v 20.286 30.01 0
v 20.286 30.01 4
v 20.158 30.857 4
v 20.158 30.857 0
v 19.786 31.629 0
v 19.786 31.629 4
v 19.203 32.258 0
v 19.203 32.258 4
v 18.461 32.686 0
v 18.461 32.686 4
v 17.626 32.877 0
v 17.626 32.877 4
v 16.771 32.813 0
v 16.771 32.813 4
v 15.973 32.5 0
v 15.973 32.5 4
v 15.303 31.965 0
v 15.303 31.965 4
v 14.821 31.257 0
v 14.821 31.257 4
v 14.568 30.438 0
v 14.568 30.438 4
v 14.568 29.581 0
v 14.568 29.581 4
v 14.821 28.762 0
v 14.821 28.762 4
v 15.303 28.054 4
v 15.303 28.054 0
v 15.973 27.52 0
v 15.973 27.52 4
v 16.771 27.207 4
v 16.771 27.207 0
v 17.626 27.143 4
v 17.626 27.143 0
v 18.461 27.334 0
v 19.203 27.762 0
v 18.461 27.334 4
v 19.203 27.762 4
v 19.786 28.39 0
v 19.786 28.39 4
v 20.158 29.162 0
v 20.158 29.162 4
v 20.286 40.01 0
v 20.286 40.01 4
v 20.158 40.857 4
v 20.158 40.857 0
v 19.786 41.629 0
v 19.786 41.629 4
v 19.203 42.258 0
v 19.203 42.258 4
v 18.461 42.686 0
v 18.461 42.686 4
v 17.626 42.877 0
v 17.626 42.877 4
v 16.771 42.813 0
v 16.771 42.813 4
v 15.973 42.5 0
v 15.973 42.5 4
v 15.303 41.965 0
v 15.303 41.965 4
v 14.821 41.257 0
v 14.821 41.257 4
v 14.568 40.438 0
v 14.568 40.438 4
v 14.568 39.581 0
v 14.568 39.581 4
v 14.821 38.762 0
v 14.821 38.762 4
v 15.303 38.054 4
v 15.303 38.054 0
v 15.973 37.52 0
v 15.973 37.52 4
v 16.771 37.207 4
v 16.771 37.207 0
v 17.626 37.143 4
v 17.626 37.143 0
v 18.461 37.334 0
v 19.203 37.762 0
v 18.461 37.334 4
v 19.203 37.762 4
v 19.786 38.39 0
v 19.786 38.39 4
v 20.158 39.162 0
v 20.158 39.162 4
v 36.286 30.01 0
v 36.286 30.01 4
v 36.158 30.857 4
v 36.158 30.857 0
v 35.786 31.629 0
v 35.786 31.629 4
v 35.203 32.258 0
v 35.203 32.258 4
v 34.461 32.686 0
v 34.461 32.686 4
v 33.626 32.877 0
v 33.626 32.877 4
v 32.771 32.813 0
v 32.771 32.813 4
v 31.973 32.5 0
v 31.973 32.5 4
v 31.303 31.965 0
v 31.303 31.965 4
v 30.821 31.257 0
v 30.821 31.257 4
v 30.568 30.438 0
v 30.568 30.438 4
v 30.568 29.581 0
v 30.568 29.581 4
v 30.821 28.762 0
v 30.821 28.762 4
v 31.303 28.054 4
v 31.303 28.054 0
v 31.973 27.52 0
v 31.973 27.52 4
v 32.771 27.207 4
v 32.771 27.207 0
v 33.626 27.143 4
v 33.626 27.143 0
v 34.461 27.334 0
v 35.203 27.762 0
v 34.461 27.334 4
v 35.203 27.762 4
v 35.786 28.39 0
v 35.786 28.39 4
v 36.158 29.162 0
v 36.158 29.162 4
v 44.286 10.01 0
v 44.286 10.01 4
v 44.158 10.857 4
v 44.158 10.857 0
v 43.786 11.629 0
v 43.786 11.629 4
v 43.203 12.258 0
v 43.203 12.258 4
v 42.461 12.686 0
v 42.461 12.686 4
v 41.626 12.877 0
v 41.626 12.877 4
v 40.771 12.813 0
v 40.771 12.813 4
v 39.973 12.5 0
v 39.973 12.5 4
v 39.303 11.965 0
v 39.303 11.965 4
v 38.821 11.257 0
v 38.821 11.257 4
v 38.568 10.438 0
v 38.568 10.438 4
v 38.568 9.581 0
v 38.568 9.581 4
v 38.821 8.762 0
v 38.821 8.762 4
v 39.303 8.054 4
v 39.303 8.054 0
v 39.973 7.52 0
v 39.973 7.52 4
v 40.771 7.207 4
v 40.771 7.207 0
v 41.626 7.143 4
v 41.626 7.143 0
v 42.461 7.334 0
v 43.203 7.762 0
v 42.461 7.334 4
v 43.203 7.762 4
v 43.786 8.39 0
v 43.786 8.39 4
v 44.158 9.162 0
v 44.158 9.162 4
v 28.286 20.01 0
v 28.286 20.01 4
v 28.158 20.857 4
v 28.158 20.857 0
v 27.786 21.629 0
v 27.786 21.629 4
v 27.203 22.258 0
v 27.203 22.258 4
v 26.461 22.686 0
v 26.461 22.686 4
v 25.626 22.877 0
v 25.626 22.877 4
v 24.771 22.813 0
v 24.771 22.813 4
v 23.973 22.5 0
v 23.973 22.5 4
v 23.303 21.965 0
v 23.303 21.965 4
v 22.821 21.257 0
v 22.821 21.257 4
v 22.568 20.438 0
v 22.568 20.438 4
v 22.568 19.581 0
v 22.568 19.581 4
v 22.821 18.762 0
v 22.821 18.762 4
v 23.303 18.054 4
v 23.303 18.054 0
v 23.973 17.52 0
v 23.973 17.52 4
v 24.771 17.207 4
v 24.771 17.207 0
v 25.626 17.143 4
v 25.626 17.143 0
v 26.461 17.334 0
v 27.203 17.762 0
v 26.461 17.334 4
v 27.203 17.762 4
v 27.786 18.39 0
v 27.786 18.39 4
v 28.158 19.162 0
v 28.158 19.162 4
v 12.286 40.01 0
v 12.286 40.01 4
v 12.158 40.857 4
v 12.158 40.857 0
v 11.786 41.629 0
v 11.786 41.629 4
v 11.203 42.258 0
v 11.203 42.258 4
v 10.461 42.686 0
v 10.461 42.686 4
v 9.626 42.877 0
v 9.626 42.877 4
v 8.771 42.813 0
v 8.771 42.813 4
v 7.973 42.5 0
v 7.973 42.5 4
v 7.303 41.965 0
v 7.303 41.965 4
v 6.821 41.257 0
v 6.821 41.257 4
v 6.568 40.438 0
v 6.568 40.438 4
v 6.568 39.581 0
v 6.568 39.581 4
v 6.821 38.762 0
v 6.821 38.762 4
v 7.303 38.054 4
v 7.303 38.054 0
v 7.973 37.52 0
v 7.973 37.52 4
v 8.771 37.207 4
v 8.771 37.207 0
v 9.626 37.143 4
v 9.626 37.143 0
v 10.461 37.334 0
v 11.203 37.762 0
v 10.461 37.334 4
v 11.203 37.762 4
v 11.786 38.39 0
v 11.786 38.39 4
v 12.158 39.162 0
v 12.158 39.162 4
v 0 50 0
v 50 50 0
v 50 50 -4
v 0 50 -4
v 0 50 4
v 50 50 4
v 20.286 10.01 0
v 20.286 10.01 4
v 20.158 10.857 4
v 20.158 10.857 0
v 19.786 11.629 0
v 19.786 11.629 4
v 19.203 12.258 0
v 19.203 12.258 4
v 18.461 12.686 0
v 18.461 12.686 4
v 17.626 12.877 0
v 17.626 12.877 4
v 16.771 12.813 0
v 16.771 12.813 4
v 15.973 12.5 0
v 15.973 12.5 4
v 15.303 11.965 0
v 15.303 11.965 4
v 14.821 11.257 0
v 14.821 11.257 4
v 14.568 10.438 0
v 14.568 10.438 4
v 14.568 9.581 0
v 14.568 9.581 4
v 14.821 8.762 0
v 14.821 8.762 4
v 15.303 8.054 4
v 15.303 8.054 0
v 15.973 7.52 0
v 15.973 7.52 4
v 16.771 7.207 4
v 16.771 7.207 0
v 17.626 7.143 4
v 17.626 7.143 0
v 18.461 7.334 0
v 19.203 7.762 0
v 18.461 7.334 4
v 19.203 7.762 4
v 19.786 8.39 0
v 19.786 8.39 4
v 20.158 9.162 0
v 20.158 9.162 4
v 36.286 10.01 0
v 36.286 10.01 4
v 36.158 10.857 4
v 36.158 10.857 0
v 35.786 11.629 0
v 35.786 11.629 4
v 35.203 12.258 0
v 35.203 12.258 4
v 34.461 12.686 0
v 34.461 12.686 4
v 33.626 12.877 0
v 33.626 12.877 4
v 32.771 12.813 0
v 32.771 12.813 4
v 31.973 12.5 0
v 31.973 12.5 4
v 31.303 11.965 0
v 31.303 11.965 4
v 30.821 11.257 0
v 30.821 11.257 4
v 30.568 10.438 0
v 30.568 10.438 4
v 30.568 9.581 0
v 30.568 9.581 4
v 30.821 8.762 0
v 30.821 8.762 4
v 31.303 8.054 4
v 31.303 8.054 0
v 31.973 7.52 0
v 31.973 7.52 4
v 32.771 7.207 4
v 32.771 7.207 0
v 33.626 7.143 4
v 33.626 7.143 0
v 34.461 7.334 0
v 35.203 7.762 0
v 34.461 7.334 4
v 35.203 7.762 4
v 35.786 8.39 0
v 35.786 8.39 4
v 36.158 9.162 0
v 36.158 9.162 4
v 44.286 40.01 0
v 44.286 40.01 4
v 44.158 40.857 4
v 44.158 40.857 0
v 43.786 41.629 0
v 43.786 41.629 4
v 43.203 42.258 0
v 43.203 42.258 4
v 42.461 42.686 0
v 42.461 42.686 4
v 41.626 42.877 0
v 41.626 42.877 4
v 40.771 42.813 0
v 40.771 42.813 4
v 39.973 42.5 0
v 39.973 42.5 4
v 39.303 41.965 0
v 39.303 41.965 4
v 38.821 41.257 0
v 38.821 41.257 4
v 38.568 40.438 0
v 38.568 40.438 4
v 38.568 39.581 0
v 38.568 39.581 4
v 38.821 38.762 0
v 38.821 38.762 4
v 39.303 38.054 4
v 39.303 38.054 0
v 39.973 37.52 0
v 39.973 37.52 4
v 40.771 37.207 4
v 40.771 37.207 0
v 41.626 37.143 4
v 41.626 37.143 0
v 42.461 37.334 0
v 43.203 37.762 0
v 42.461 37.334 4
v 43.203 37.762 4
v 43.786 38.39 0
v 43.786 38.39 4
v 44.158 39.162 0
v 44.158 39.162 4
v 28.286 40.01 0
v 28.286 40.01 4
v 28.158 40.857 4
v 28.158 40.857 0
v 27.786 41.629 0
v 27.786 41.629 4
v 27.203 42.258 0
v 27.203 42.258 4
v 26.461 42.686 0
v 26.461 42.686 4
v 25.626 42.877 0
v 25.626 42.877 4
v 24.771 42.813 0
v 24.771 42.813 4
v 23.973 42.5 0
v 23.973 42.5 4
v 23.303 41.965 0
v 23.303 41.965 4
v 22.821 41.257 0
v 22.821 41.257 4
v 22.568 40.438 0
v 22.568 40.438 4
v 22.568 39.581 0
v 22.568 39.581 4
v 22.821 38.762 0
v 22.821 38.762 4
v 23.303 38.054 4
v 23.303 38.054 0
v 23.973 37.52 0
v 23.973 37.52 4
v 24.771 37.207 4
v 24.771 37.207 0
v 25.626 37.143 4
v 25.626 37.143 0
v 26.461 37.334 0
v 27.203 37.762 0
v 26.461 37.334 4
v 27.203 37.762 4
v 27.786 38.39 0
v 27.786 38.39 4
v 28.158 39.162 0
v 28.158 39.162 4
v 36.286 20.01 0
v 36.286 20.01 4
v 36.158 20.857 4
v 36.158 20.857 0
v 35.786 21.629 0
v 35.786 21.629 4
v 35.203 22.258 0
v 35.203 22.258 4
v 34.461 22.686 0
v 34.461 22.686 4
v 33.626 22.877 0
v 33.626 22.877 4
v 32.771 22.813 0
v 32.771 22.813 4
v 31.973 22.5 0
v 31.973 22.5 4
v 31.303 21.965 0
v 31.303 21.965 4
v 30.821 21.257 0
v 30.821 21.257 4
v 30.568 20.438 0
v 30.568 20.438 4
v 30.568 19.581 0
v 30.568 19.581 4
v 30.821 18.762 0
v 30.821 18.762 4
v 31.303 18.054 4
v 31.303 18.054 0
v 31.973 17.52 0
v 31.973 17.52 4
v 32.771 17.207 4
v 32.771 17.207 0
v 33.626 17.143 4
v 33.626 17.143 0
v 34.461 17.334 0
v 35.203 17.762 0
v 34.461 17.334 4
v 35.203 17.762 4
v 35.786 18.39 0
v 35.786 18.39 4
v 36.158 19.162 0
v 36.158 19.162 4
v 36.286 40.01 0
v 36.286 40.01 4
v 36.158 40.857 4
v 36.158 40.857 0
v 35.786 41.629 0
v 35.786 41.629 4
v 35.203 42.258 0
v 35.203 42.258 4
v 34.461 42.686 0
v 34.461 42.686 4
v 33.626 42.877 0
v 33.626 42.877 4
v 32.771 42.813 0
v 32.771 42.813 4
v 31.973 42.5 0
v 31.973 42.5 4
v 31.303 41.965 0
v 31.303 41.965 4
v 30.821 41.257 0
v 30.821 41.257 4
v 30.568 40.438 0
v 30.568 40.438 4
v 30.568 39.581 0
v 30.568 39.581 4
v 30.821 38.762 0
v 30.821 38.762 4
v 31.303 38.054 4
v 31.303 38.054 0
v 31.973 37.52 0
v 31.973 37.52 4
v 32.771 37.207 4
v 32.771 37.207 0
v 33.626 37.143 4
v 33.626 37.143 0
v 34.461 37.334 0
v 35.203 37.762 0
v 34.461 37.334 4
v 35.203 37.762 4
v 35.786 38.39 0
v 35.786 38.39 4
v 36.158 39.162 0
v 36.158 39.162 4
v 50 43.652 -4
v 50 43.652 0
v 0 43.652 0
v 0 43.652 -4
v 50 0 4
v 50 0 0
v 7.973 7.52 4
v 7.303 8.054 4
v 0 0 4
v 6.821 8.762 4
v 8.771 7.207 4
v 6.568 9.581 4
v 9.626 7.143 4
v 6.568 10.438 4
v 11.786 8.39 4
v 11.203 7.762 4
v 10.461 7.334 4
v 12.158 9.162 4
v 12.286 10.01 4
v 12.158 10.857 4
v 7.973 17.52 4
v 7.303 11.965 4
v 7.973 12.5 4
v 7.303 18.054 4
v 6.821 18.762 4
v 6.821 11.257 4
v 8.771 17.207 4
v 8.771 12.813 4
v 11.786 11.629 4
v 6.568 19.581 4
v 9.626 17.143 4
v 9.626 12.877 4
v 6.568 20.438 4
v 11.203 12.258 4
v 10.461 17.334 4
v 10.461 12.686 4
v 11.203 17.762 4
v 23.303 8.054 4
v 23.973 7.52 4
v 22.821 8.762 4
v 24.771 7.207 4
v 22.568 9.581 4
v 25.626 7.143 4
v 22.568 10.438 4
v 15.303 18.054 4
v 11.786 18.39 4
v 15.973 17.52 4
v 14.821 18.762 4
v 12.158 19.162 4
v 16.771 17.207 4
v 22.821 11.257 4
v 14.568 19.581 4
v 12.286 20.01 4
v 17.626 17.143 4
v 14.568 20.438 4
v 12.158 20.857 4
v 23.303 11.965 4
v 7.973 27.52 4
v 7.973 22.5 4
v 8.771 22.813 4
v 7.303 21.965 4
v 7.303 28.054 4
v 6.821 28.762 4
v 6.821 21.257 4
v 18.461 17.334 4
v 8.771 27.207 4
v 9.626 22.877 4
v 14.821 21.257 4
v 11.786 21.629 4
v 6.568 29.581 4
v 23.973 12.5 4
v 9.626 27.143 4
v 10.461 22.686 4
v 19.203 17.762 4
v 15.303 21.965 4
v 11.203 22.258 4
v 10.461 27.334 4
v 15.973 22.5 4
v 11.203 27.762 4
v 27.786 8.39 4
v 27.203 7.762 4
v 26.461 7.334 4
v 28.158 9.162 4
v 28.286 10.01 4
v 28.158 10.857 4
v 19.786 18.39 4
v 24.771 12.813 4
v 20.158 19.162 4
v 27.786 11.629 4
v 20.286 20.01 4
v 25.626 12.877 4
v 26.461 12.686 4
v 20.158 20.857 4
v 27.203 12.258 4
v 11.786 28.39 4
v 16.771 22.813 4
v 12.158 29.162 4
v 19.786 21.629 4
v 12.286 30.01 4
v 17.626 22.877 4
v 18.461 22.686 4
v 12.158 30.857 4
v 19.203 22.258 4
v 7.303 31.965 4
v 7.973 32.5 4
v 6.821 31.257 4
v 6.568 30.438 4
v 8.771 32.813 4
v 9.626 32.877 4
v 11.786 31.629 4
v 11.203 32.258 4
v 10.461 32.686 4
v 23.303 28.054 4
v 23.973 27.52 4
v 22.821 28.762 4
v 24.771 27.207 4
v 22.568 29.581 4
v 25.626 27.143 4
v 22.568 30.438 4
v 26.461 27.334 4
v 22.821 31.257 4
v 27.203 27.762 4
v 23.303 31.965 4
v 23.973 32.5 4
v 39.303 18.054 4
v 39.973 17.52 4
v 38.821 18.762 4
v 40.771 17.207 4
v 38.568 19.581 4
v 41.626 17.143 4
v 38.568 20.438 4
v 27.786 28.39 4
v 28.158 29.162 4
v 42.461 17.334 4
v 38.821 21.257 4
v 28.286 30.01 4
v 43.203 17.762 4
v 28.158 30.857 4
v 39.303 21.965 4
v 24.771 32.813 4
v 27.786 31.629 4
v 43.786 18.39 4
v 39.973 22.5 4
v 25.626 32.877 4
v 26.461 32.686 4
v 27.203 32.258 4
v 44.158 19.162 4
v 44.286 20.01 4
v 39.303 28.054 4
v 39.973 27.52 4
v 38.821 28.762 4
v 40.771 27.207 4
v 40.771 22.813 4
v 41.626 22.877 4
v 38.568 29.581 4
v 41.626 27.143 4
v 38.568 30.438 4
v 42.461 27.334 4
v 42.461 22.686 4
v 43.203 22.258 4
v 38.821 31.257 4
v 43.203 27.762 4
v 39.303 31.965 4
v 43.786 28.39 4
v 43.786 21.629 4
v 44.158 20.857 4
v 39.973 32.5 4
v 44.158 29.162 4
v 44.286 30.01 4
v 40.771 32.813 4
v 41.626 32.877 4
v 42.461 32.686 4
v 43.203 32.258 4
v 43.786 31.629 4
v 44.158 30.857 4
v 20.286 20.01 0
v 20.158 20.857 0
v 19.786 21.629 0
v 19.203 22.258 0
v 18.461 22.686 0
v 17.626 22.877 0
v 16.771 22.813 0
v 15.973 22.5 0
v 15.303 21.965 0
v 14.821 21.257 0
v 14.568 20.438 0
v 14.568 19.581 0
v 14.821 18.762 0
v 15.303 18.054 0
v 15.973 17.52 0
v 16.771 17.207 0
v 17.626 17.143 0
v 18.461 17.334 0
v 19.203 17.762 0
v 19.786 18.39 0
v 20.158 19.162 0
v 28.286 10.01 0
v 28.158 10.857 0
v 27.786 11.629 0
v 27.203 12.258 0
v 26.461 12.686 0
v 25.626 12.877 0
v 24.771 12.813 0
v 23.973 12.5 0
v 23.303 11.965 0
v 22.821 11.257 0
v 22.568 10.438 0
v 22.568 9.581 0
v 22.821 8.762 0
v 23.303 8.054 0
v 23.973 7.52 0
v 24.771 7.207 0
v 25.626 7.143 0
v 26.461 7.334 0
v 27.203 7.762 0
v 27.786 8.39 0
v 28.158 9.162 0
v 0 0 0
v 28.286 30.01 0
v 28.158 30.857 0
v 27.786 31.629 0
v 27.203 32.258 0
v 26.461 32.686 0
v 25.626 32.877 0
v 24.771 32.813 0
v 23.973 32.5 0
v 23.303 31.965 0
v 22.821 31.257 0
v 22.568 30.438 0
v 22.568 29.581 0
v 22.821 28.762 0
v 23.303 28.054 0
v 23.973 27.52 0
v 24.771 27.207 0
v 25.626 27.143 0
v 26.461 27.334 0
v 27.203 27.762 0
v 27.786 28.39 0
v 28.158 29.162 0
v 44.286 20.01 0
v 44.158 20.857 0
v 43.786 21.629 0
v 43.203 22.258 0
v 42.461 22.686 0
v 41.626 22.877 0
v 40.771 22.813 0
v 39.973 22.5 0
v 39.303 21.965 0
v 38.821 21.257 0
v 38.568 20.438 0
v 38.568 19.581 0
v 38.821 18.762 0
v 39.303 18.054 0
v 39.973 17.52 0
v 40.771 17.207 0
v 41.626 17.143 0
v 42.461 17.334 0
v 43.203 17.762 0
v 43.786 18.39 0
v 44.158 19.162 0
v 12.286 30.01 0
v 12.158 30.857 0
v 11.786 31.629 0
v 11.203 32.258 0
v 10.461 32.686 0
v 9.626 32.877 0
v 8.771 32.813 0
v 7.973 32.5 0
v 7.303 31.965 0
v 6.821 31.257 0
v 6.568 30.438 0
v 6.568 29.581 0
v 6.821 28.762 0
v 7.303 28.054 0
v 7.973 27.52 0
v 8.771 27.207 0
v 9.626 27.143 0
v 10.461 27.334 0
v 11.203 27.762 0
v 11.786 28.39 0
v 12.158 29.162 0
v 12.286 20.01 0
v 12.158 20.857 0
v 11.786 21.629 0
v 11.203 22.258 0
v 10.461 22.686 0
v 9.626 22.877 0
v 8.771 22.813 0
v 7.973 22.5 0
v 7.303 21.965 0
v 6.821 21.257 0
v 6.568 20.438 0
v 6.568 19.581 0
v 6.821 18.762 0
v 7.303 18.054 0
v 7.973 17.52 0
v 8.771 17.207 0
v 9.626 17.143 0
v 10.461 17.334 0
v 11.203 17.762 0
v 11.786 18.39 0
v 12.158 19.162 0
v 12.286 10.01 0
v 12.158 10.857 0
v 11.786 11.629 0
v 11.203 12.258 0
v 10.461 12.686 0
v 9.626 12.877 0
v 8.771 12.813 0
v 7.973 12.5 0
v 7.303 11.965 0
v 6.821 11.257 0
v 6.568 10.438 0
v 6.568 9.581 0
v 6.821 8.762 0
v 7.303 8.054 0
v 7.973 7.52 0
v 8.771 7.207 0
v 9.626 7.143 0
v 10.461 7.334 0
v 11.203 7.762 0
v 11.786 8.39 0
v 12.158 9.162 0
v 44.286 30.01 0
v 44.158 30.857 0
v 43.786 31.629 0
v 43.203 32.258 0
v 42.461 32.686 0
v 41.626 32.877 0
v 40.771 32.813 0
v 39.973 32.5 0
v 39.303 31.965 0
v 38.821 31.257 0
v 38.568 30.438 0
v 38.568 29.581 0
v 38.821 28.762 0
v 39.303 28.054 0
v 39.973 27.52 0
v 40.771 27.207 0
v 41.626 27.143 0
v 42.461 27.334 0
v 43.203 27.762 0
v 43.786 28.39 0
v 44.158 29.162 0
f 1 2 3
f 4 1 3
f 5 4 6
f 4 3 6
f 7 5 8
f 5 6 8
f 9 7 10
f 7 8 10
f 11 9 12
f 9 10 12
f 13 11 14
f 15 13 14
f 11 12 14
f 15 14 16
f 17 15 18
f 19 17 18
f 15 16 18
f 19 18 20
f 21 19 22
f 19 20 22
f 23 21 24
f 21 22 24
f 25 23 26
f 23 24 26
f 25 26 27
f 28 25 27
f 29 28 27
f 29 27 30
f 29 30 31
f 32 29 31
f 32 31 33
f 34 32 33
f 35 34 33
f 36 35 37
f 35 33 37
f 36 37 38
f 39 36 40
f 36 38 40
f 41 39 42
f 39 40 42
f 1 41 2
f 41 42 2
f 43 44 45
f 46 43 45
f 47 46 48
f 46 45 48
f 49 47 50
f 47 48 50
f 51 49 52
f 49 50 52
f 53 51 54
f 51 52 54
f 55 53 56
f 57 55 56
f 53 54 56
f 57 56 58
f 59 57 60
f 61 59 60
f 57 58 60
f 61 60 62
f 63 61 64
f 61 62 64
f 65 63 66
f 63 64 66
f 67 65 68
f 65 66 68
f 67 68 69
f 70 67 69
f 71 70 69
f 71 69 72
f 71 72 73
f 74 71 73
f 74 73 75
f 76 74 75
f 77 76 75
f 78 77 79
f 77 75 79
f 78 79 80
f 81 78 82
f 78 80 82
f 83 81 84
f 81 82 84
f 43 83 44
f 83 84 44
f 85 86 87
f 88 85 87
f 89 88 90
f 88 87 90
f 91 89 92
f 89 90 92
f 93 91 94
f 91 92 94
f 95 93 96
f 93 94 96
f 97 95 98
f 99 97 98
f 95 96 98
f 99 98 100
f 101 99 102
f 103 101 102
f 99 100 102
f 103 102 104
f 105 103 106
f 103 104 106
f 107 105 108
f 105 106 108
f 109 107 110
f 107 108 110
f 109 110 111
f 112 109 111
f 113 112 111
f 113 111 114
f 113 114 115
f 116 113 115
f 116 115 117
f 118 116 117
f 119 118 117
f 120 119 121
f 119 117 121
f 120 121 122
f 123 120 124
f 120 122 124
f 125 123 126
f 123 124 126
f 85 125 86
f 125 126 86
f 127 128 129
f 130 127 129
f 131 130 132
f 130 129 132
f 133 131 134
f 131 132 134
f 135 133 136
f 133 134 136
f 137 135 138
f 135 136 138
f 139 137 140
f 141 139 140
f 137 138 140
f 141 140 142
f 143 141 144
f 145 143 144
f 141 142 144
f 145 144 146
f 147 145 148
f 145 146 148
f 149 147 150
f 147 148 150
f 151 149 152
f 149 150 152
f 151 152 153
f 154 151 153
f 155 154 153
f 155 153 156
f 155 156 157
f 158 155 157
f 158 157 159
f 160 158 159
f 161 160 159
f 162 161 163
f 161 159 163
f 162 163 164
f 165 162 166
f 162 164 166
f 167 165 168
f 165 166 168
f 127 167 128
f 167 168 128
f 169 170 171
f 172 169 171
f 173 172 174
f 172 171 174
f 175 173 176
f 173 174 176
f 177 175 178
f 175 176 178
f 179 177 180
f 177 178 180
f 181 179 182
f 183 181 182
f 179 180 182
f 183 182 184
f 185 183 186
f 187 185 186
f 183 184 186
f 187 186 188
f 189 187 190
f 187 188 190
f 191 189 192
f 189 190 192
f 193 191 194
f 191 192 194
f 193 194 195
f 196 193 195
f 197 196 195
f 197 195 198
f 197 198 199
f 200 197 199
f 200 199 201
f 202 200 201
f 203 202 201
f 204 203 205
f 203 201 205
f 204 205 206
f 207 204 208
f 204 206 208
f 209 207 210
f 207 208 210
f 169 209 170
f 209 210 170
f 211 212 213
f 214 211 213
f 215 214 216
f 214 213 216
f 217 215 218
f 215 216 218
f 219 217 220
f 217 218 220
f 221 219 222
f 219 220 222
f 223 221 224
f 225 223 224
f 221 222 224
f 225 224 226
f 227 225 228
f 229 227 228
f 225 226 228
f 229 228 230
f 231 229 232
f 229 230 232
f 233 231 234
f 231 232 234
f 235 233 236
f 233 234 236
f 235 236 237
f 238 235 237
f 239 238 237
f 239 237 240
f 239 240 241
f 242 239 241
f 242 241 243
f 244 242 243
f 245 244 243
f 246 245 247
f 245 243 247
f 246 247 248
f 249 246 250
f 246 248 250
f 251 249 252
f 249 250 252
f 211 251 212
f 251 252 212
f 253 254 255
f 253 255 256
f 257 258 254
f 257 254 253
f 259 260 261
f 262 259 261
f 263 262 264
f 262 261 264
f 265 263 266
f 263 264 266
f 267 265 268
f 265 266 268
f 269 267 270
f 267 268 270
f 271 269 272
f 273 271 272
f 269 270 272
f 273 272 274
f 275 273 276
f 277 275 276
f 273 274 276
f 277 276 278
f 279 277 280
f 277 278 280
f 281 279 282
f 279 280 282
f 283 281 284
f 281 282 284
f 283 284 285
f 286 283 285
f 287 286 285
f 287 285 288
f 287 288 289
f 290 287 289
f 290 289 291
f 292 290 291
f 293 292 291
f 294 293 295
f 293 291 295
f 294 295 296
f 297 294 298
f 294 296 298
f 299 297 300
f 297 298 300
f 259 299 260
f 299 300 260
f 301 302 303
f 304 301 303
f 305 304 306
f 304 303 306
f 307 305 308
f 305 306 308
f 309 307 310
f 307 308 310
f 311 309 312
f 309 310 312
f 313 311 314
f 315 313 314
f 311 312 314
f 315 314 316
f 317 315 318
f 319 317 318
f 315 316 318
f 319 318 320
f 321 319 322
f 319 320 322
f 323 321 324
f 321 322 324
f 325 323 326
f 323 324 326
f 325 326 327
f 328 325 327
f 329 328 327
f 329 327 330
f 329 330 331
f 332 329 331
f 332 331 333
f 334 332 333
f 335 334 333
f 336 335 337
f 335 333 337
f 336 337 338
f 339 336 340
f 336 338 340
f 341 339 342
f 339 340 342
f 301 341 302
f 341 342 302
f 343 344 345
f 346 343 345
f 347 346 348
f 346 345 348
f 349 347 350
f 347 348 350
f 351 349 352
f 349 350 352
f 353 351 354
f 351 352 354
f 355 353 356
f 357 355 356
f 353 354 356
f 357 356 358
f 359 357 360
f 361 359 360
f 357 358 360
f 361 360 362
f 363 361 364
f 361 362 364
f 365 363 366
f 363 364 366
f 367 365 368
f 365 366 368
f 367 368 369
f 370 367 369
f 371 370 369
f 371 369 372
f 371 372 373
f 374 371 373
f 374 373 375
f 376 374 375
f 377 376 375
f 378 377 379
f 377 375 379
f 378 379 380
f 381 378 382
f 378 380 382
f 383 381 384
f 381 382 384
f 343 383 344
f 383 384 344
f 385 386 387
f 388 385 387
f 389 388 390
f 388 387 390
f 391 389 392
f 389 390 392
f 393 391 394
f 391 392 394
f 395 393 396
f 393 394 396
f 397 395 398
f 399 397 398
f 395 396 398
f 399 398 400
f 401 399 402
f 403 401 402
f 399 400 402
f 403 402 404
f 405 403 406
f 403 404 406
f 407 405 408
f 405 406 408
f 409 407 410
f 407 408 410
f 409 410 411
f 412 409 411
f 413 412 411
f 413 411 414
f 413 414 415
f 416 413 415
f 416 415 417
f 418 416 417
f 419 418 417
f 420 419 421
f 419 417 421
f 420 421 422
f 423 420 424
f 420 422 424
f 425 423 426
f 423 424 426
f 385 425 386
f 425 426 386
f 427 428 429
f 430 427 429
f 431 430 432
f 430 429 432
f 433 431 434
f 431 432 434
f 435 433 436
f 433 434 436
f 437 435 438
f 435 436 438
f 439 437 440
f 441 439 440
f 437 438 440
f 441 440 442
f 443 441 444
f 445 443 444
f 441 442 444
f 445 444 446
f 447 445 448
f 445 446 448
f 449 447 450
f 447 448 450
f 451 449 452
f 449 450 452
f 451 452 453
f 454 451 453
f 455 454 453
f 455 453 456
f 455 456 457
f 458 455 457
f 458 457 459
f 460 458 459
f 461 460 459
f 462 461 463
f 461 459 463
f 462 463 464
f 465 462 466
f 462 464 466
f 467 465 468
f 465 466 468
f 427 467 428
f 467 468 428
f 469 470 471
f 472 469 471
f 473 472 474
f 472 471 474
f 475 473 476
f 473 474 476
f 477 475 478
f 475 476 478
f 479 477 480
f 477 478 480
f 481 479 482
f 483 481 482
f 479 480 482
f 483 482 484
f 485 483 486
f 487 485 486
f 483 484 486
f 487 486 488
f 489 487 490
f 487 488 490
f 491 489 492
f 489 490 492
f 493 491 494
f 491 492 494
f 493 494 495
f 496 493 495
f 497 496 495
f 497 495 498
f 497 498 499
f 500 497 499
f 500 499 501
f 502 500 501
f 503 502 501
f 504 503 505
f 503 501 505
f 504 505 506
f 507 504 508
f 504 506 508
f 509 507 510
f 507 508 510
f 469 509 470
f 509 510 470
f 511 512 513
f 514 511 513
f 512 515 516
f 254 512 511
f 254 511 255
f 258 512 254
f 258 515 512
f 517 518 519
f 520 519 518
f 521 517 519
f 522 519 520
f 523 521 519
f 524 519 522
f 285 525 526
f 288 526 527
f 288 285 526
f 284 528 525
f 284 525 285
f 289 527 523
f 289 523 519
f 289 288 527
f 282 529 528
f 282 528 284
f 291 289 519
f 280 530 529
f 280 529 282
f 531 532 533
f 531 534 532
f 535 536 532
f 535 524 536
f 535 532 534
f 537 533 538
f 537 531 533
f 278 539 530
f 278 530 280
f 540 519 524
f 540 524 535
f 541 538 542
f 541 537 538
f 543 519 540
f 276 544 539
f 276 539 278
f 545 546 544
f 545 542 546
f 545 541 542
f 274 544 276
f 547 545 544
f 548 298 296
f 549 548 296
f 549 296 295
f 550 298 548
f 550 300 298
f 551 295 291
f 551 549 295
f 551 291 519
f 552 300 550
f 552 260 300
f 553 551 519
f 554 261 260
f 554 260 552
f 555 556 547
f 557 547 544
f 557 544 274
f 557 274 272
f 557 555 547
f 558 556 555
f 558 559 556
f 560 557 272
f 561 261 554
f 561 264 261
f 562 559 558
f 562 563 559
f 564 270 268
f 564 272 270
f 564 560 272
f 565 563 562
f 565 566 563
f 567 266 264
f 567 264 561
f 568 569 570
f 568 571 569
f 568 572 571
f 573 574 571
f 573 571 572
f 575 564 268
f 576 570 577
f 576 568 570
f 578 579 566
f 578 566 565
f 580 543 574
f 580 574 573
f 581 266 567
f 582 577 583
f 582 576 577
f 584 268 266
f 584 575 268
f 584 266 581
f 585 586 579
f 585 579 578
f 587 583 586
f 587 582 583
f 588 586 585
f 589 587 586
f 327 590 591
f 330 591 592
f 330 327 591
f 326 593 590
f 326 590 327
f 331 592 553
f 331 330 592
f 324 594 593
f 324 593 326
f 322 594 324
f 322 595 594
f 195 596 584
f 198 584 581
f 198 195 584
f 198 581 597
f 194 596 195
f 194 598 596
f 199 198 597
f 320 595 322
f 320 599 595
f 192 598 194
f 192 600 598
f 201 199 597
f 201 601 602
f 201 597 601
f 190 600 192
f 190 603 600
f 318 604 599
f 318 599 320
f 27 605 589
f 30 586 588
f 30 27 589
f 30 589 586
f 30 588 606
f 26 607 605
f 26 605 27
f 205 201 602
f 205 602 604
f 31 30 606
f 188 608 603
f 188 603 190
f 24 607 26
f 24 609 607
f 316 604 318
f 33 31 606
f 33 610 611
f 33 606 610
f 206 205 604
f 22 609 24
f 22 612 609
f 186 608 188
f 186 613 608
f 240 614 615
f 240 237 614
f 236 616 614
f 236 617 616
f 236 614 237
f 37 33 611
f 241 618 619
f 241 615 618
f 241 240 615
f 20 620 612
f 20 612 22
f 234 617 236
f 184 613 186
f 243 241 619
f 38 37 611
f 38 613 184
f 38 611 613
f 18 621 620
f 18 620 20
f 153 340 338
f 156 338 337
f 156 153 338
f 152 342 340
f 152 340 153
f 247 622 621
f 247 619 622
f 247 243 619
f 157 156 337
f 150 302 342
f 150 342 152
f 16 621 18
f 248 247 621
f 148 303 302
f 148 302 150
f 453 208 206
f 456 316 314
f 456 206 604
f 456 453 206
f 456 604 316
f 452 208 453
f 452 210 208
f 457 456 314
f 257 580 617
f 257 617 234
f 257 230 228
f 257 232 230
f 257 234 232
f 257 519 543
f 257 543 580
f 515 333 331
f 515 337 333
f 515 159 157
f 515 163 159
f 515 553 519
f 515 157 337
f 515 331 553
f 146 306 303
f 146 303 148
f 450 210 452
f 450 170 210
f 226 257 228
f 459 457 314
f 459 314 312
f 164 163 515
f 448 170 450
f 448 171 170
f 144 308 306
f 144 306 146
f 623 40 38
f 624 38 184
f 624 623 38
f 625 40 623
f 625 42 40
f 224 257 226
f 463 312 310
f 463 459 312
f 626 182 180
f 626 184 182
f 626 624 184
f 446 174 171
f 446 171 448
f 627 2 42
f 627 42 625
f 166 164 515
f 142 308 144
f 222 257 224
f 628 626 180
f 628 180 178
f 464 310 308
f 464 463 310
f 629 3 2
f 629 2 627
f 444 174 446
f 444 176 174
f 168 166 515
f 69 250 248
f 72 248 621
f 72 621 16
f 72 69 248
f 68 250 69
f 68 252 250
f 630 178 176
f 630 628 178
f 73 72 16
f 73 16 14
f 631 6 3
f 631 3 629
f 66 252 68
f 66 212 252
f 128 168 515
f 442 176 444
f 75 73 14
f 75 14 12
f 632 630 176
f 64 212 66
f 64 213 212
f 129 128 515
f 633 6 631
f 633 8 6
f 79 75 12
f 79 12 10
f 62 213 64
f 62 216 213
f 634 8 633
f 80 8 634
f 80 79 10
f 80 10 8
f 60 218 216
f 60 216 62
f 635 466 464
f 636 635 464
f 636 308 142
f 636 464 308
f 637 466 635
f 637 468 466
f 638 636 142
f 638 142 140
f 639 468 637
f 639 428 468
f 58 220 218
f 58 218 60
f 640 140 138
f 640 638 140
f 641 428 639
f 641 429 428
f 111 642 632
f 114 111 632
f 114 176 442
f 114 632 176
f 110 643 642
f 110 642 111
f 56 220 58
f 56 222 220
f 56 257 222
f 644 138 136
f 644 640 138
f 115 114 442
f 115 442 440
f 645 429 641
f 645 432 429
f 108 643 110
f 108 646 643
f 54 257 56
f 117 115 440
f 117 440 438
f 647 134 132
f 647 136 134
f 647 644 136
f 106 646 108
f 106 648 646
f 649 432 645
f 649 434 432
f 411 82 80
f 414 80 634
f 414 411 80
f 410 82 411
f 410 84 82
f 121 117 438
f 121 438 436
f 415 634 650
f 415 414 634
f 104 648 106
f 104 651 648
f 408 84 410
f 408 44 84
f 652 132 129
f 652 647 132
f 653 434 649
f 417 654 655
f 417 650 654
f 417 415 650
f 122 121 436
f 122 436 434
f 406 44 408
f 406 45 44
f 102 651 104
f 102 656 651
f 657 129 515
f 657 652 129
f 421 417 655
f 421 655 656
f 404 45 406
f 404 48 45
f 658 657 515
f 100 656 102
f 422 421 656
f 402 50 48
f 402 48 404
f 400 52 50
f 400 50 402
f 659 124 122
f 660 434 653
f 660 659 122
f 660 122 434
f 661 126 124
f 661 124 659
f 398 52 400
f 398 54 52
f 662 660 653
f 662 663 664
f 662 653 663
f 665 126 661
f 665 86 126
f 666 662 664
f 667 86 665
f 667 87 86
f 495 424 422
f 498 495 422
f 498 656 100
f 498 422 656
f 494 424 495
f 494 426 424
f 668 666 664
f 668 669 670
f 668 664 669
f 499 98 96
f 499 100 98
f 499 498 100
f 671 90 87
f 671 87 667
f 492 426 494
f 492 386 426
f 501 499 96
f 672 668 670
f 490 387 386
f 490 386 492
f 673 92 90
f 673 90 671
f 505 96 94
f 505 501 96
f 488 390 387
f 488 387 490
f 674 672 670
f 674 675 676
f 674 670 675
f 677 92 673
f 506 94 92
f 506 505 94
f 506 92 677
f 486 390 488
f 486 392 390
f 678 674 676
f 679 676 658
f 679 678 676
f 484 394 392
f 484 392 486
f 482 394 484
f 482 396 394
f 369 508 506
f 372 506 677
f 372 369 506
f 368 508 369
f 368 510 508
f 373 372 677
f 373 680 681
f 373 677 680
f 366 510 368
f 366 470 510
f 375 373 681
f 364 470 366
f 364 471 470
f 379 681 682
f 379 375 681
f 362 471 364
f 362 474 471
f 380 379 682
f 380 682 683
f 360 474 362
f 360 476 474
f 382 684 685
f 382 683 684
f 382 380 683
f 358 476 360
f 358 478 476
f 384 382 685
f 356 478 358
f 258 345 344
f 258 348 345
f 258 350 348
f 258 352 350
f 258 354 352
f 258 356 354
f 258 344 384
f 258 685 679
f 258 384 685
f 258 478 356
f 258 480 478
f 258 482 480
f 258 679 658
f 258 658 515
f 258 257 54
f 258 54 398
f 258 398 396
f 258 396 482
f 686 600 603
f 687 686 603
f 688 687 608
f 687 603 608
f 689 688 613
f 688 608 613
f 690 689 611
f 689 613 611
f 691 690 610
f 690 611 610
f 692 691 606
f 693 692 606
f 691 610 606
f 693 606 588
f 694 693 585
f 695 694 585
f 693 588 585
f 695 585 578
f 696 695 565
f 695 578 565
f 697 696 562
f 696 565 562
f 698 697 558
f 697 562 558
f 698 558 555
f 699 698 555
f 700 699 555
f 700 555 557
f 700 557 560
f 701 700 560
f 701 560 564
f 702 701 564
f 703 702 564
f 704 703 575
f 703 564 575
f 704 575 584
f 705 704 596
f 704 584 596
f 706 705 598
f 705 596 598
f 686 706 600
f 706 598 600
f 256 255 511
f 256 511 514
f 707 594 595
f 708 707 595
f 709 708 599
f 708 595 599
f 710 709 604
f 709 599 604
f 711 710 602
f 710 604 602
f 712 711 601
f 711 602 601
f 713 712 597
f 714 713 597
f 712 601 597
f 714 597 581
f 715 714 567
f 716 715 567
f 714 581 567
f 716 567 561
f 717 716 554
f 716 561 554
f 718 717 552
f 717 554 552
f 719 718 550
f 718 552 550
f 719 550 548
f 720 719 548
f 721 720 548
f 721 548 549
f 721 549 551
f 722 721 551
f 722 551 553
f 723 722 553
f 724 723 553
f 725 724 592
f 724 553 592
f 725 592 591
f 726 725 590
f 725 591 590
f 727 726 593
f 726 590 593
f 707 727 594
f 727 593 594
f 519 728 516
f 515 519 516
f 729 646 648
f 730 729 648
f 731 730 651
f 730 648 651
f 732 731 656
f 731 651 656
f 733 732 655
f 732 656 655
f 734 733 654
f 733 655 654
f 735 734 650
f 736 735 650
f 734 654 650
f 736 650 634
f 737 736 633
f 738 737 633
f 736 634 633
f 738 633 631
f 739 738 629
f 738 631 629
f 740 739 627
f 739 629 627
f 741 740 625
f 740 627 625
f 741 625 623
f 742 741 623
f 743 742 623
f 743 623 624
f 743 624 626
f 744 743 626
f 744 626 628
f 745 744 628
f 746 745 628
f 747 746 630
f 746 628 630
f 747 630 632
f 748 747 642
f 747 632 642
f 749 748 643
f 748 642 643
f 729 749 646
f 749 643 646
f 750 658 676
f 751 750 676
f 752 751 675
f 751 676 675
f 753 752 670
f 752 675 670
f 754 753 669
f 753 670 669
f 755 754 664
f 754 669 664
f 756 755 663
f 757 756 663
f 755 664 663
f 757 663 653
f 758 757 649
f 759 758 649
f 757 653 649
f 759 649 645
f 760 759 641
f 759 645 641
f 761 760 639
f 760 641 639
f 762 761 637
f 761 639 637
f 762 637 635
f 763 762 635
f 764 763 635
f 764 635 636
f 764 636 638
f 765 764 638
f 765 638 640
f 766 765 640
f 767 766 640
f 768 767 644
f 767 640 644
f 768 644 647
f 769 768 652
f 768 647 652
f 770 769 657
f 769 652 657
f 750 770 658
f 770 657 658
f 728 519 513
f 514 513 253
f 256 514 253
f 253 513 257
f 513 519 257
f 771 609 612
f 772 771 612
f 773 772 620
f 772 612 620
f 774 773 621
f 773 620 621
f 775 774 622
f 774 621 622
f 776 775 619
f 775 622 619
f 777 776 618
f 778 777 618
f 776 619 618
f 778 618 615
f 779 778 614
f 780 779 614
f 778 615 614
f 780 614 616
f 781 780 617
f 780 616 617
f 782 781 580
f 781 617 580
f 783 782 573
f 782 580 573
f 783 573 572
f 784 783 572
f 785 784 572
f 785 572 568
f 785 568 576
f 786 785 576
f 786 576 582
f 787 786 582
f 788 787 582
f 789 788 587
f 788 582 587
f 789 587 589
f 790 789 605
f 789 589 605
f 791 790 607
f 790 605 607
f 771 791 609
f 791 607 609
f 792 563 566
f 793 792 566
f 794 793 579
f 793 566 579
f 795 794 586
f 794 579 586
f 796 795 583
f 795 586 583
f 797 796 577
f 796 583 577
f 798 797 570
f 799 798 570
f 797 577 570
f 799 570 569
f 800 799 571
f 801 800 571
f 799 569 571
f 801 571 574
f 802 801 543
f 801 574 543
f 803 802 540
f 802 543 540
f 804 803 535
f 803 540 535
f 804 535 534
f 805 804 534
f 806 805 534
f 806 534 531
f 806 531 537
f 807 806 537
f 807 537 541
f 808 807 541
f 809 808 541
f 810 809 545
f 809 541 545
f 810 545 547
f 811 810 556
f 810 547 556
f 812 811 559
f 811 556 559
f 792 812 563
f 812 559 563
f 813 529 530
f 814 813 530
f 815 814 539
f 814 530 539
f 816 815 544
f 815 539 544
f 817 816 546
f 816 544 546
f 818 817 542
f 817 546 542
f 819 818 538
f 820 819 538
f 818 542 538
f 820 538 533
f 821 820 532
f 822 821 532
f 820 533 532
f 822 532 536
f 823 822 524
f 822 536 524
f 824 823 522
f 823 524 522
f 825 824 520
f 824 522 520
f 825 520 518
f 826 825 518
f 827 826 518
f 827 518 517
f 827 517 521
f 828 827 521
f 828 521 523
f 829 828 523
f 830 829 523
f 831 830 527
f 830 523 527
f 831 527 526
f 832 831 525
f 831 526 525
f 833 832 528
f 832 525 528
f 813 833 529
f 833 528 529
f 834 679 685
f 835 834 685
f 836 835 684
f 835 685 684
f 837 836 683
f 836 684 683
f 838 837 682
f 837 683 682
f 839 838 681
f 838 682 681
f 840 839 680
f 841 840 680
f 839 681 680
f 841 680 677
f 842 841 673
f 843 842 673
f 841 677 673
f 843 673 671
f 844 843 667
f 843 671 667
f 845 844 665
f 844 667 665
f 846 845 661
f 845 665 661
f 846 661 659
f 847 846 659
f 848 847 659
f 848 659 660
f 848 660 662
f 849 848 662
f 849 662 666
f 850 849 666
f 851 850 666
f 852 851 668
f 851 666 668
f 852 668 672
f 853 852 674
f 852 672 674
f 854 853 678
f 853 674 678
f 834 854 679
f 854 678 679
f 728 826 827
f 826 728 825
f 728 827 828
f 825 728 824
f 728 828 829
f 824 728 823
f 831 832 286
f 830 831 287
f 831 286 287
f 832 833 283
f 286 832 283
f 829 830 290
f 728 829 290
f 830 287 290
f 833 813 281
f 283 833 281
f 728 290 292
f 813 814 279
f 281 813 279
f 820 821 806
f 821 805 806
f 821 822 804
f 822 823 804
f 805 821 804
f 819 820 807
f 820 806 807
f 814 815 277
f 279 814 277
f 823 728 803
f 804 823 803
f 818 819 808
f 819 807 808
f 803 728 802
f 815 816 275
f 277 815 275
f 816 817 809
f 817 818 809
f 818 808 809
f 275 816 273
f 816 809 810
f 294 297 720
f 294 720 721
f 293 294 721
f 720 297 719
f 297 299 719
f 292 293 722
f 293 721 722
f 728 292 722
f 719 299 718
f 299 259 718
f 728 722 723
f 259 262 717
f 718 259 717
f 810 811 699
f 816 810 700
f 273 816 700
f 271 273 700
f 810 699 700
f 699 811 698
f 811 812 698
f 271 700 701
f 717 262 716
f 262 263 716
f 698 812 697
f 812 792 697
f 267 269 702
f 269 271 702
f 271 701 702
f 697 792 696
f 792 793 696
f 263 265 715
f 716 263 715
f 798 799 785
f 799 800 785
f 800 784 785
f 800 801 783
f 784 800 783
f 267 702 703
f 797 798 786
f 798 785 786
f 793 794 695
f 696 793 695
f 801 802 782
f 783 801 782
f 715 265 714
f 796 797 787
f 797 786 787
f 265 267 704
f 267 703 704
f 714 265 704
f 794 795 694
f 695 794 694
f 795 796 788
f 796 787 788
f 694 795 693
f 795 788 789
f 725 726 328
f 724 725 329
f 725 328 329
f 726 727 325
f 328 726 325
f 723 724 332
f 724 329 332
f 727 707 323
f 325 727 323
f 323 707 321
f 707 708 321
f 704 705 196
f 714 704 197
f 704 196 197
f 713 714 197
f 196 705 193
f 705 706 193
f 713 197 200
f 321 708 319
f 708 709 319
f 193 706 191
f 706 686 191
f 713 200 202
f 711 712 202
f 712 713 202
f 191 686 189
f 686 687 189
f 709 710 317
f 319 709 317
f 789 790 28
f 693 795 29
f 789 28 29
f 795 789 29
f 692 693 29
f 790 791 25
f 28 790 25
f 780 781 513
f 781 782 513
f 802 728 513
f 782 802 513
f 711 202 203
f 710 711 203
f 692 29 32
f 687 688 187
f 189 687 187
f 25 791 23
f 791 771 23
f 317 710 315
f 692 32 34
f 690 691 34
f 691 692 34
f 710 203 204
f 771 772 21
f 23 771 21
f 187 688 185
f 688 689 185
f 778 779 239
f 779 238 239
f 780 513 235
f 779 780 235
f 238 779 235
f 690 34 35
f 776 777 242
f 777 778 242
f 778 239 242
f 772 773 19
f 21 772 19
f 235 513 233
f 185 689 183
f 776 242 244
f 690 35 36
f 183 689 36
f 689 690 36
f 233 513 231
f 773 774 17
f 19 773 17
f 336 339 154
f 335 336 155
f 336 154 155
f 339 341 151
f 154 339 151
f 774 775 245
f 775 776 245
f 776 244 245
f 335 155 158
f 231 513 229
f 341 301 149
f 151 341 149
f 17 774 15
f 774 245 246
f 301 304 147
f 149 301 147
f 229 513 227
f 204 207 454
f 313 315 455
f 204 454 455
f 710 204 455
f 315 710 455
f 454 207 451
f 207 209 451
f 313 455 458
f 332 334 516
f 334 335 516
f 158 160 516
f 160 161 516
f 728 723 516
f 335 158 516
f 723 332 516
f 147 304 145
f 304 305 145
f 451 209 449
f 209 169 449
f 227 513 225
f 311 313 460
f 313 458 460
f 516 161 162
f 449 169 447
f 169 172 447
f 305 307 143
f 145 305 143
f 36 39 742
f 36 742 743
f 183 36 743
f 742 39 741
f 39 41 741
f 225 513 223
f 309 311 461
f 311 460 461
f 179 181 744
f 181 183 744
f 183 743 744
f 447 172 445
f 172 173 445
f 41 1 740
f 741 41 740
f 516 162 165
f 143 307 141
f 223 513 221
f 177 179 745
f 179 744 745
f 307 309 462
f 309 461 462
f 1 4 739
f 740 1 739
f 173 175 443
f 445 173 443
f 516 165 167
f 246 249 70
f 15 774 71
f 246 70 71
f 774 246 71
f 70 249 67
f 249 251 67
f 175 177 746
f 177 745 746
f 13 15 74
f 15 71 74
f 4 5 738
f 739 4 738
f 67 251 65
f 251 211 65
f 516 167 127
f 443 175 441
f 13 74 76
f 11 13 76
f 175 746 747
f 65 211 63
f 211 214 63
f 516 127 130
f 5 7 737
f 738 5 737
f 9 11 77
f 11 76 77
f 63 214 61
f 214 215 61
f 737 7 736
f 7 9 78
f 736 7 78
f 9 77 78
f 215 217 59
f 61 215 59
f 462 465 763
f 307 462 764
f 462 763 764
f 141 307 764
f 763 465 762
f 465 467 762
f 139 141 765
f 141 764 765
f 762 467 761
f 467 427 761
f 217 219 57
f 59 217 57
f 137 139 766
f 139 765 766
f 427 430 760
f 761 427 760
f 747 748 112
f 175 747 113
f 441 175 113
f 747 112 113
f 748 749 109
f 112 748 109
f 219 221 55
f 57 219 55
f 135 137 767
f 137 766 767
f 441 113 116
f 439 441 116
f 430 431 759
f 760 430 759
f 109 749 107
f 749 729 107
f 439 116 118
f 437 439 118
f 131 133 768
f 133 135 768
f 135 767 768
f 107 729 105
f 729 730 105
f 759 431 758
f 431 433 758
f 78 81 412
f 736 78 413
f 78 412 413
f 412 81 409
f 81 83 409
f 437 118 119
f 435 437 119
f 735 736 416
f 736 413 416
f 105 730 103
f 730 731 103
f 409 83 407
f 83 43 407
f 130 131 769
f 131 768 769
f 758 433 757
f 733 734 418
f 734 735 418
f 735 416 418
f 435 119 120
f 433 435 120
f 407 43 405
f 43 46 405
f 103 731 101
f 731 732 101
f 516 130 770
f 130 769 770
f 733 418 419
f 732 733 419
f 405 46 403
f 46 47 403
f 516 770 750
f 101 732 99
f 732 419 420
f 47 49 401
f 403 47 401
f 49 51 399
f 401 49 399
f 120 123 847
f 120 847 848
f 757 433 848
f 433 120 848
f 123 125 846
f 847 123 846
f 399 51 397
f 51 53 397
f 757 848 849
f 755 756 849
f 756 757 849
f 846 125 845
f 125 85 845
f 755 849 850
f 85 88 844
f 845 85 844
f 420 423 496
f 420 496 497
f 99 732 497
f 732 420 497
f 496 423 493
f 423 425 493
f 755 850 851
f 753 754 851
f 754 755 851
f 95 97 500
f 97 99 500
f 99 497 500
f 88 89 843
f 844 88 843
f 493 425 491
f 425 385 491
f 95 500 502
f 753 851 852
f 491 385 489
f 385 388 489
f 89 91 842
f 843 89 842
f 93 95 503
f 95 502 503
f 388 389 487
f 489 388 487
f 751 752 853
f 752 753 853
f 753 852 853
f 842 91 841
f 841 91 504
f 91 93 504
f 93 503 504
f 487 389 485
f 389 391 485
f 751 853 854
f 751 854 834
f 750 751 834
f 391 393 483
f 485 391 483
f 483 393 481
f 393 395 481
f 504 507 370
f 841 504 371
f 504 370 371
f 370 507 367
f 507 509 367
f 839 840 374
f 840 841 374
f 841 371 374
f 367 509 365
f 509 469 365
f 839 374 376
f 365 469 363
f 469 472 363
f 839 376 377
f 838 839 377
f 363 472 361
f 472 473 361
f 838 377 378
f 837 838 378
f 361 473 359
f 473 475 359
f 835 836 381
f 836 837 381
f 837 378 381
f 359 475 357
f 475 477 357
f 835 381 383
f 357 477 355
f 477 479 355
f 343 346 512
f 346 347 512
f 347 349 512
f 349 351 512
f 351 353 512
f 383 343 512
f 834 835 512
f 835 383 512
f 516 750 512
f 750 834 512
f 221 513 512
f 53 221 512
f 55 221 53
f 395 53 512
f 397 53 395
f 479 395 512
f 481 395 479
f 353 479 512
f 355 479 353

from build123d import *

# Parameters (mm, degrees)
SKETCH1_W           = 50
SKETCH1_H           = 50
BOSS_EXTRUDE1_DEPTH = 4
SKETCH2_R           = 2.874998181
CUT_EXTRUDE1_DEPTH  = 4
SKETCH3_W           = 50
SKETCH3_H           = 6.348267119
BOSS_EXTRUDE2_DEPTH = 4


with BuildPart() as part:
    # Sketch1 → Boss-Extrude1 (new body)
    with BuildSketch(Plane.XY):
        with Locations((25, 25)):
            Rectangle(SKETCH1_W, SKETCH1_H)
    extrude(amount=BOSS_EXTRUDE1_DEPTH)

    # Sketch2 → Cut-Extrude1 (cut)
    with BuildSketch(Plane.XY.offset(4)):
        with Locations((9.410896039, 40.009779151)):
            Circle(SKETCH2_R)
        with Locations((17.410896039, 40.009779151)):
            Circle(SKETCH2_R)
        with Locations((25.410896039, 40.009779151)):
            Circle(SKETCH2_R)
        with Locations((33.410896039, 40.009779151)):
            Circle(SKETCH2_R)
        with Locations((41.410896039, 40.009779151)):
            Circle(SKETCH2_R)
        with Locations((17.410896039, 30.009779151)):
            Circle(SKETCH2_R)
        with Locations((25.410896039, 30.009779151)):
            Circle(SKETCH2_R)
        with Locations((33.410896039, 30.009779151)):
            Circle(SKETCH2_R)
        with Locations((41.410896039, 30.009779151)):
            Circle(SKETCH2_R)
        with Locations((17.410896039, 20.009779151)):
            Circle(SKETCH2_R)
        with Locations((25.410896039, 20.009779151)):
            Circle(SKETCH2_R)
        with Locations((33.410896039, 20.009779151)):
            Circle(SKETCH2_R)
        with Locations((41.410896039, 20.009779151)):
            Circle(SKETCH2_R)
        with Locations((17.410896039, 10.009779151)):
            Circle(SKETCH2_R)
        with Locations((25.410896039, 10.009779151)):
            Circle(SKETCH2_R)
        with Locations((33.410896039, 10.009779151)):
            Circle(SKETCH2_R)
        with Locations((41.410896039, 10.009779151)):
            Circle(SKETCH2_R)
        with Locations((9.410896039, 30.009779151)):
            Circle(SKETCH2_R)
        with Locations((9.410896039, 20.009779151)):
            Circle(SKETCH2_R)
        with Locations((9.410896039, 10.009779151)):
            Circle(SKETCH2_R)
    extrude(amount=-CUT_EXTRUDE1_DEPTH, mode=Mode.SUBTRACT)

    # Sketch3 → Boss-Extrude2 (add)
    with BuildSketch(Plane(origin=(0, 0, 0), x_dir=(-1, 0, 0), z_dir=(0, 0, -1))):
        with Locations((-25, 46.825866441)):
            Rectangle(SKETCH3_W, SKETCH3_H)
    extrude(amount=BOSS_EXTRUDE2_DEPTH)


solid = part.part
